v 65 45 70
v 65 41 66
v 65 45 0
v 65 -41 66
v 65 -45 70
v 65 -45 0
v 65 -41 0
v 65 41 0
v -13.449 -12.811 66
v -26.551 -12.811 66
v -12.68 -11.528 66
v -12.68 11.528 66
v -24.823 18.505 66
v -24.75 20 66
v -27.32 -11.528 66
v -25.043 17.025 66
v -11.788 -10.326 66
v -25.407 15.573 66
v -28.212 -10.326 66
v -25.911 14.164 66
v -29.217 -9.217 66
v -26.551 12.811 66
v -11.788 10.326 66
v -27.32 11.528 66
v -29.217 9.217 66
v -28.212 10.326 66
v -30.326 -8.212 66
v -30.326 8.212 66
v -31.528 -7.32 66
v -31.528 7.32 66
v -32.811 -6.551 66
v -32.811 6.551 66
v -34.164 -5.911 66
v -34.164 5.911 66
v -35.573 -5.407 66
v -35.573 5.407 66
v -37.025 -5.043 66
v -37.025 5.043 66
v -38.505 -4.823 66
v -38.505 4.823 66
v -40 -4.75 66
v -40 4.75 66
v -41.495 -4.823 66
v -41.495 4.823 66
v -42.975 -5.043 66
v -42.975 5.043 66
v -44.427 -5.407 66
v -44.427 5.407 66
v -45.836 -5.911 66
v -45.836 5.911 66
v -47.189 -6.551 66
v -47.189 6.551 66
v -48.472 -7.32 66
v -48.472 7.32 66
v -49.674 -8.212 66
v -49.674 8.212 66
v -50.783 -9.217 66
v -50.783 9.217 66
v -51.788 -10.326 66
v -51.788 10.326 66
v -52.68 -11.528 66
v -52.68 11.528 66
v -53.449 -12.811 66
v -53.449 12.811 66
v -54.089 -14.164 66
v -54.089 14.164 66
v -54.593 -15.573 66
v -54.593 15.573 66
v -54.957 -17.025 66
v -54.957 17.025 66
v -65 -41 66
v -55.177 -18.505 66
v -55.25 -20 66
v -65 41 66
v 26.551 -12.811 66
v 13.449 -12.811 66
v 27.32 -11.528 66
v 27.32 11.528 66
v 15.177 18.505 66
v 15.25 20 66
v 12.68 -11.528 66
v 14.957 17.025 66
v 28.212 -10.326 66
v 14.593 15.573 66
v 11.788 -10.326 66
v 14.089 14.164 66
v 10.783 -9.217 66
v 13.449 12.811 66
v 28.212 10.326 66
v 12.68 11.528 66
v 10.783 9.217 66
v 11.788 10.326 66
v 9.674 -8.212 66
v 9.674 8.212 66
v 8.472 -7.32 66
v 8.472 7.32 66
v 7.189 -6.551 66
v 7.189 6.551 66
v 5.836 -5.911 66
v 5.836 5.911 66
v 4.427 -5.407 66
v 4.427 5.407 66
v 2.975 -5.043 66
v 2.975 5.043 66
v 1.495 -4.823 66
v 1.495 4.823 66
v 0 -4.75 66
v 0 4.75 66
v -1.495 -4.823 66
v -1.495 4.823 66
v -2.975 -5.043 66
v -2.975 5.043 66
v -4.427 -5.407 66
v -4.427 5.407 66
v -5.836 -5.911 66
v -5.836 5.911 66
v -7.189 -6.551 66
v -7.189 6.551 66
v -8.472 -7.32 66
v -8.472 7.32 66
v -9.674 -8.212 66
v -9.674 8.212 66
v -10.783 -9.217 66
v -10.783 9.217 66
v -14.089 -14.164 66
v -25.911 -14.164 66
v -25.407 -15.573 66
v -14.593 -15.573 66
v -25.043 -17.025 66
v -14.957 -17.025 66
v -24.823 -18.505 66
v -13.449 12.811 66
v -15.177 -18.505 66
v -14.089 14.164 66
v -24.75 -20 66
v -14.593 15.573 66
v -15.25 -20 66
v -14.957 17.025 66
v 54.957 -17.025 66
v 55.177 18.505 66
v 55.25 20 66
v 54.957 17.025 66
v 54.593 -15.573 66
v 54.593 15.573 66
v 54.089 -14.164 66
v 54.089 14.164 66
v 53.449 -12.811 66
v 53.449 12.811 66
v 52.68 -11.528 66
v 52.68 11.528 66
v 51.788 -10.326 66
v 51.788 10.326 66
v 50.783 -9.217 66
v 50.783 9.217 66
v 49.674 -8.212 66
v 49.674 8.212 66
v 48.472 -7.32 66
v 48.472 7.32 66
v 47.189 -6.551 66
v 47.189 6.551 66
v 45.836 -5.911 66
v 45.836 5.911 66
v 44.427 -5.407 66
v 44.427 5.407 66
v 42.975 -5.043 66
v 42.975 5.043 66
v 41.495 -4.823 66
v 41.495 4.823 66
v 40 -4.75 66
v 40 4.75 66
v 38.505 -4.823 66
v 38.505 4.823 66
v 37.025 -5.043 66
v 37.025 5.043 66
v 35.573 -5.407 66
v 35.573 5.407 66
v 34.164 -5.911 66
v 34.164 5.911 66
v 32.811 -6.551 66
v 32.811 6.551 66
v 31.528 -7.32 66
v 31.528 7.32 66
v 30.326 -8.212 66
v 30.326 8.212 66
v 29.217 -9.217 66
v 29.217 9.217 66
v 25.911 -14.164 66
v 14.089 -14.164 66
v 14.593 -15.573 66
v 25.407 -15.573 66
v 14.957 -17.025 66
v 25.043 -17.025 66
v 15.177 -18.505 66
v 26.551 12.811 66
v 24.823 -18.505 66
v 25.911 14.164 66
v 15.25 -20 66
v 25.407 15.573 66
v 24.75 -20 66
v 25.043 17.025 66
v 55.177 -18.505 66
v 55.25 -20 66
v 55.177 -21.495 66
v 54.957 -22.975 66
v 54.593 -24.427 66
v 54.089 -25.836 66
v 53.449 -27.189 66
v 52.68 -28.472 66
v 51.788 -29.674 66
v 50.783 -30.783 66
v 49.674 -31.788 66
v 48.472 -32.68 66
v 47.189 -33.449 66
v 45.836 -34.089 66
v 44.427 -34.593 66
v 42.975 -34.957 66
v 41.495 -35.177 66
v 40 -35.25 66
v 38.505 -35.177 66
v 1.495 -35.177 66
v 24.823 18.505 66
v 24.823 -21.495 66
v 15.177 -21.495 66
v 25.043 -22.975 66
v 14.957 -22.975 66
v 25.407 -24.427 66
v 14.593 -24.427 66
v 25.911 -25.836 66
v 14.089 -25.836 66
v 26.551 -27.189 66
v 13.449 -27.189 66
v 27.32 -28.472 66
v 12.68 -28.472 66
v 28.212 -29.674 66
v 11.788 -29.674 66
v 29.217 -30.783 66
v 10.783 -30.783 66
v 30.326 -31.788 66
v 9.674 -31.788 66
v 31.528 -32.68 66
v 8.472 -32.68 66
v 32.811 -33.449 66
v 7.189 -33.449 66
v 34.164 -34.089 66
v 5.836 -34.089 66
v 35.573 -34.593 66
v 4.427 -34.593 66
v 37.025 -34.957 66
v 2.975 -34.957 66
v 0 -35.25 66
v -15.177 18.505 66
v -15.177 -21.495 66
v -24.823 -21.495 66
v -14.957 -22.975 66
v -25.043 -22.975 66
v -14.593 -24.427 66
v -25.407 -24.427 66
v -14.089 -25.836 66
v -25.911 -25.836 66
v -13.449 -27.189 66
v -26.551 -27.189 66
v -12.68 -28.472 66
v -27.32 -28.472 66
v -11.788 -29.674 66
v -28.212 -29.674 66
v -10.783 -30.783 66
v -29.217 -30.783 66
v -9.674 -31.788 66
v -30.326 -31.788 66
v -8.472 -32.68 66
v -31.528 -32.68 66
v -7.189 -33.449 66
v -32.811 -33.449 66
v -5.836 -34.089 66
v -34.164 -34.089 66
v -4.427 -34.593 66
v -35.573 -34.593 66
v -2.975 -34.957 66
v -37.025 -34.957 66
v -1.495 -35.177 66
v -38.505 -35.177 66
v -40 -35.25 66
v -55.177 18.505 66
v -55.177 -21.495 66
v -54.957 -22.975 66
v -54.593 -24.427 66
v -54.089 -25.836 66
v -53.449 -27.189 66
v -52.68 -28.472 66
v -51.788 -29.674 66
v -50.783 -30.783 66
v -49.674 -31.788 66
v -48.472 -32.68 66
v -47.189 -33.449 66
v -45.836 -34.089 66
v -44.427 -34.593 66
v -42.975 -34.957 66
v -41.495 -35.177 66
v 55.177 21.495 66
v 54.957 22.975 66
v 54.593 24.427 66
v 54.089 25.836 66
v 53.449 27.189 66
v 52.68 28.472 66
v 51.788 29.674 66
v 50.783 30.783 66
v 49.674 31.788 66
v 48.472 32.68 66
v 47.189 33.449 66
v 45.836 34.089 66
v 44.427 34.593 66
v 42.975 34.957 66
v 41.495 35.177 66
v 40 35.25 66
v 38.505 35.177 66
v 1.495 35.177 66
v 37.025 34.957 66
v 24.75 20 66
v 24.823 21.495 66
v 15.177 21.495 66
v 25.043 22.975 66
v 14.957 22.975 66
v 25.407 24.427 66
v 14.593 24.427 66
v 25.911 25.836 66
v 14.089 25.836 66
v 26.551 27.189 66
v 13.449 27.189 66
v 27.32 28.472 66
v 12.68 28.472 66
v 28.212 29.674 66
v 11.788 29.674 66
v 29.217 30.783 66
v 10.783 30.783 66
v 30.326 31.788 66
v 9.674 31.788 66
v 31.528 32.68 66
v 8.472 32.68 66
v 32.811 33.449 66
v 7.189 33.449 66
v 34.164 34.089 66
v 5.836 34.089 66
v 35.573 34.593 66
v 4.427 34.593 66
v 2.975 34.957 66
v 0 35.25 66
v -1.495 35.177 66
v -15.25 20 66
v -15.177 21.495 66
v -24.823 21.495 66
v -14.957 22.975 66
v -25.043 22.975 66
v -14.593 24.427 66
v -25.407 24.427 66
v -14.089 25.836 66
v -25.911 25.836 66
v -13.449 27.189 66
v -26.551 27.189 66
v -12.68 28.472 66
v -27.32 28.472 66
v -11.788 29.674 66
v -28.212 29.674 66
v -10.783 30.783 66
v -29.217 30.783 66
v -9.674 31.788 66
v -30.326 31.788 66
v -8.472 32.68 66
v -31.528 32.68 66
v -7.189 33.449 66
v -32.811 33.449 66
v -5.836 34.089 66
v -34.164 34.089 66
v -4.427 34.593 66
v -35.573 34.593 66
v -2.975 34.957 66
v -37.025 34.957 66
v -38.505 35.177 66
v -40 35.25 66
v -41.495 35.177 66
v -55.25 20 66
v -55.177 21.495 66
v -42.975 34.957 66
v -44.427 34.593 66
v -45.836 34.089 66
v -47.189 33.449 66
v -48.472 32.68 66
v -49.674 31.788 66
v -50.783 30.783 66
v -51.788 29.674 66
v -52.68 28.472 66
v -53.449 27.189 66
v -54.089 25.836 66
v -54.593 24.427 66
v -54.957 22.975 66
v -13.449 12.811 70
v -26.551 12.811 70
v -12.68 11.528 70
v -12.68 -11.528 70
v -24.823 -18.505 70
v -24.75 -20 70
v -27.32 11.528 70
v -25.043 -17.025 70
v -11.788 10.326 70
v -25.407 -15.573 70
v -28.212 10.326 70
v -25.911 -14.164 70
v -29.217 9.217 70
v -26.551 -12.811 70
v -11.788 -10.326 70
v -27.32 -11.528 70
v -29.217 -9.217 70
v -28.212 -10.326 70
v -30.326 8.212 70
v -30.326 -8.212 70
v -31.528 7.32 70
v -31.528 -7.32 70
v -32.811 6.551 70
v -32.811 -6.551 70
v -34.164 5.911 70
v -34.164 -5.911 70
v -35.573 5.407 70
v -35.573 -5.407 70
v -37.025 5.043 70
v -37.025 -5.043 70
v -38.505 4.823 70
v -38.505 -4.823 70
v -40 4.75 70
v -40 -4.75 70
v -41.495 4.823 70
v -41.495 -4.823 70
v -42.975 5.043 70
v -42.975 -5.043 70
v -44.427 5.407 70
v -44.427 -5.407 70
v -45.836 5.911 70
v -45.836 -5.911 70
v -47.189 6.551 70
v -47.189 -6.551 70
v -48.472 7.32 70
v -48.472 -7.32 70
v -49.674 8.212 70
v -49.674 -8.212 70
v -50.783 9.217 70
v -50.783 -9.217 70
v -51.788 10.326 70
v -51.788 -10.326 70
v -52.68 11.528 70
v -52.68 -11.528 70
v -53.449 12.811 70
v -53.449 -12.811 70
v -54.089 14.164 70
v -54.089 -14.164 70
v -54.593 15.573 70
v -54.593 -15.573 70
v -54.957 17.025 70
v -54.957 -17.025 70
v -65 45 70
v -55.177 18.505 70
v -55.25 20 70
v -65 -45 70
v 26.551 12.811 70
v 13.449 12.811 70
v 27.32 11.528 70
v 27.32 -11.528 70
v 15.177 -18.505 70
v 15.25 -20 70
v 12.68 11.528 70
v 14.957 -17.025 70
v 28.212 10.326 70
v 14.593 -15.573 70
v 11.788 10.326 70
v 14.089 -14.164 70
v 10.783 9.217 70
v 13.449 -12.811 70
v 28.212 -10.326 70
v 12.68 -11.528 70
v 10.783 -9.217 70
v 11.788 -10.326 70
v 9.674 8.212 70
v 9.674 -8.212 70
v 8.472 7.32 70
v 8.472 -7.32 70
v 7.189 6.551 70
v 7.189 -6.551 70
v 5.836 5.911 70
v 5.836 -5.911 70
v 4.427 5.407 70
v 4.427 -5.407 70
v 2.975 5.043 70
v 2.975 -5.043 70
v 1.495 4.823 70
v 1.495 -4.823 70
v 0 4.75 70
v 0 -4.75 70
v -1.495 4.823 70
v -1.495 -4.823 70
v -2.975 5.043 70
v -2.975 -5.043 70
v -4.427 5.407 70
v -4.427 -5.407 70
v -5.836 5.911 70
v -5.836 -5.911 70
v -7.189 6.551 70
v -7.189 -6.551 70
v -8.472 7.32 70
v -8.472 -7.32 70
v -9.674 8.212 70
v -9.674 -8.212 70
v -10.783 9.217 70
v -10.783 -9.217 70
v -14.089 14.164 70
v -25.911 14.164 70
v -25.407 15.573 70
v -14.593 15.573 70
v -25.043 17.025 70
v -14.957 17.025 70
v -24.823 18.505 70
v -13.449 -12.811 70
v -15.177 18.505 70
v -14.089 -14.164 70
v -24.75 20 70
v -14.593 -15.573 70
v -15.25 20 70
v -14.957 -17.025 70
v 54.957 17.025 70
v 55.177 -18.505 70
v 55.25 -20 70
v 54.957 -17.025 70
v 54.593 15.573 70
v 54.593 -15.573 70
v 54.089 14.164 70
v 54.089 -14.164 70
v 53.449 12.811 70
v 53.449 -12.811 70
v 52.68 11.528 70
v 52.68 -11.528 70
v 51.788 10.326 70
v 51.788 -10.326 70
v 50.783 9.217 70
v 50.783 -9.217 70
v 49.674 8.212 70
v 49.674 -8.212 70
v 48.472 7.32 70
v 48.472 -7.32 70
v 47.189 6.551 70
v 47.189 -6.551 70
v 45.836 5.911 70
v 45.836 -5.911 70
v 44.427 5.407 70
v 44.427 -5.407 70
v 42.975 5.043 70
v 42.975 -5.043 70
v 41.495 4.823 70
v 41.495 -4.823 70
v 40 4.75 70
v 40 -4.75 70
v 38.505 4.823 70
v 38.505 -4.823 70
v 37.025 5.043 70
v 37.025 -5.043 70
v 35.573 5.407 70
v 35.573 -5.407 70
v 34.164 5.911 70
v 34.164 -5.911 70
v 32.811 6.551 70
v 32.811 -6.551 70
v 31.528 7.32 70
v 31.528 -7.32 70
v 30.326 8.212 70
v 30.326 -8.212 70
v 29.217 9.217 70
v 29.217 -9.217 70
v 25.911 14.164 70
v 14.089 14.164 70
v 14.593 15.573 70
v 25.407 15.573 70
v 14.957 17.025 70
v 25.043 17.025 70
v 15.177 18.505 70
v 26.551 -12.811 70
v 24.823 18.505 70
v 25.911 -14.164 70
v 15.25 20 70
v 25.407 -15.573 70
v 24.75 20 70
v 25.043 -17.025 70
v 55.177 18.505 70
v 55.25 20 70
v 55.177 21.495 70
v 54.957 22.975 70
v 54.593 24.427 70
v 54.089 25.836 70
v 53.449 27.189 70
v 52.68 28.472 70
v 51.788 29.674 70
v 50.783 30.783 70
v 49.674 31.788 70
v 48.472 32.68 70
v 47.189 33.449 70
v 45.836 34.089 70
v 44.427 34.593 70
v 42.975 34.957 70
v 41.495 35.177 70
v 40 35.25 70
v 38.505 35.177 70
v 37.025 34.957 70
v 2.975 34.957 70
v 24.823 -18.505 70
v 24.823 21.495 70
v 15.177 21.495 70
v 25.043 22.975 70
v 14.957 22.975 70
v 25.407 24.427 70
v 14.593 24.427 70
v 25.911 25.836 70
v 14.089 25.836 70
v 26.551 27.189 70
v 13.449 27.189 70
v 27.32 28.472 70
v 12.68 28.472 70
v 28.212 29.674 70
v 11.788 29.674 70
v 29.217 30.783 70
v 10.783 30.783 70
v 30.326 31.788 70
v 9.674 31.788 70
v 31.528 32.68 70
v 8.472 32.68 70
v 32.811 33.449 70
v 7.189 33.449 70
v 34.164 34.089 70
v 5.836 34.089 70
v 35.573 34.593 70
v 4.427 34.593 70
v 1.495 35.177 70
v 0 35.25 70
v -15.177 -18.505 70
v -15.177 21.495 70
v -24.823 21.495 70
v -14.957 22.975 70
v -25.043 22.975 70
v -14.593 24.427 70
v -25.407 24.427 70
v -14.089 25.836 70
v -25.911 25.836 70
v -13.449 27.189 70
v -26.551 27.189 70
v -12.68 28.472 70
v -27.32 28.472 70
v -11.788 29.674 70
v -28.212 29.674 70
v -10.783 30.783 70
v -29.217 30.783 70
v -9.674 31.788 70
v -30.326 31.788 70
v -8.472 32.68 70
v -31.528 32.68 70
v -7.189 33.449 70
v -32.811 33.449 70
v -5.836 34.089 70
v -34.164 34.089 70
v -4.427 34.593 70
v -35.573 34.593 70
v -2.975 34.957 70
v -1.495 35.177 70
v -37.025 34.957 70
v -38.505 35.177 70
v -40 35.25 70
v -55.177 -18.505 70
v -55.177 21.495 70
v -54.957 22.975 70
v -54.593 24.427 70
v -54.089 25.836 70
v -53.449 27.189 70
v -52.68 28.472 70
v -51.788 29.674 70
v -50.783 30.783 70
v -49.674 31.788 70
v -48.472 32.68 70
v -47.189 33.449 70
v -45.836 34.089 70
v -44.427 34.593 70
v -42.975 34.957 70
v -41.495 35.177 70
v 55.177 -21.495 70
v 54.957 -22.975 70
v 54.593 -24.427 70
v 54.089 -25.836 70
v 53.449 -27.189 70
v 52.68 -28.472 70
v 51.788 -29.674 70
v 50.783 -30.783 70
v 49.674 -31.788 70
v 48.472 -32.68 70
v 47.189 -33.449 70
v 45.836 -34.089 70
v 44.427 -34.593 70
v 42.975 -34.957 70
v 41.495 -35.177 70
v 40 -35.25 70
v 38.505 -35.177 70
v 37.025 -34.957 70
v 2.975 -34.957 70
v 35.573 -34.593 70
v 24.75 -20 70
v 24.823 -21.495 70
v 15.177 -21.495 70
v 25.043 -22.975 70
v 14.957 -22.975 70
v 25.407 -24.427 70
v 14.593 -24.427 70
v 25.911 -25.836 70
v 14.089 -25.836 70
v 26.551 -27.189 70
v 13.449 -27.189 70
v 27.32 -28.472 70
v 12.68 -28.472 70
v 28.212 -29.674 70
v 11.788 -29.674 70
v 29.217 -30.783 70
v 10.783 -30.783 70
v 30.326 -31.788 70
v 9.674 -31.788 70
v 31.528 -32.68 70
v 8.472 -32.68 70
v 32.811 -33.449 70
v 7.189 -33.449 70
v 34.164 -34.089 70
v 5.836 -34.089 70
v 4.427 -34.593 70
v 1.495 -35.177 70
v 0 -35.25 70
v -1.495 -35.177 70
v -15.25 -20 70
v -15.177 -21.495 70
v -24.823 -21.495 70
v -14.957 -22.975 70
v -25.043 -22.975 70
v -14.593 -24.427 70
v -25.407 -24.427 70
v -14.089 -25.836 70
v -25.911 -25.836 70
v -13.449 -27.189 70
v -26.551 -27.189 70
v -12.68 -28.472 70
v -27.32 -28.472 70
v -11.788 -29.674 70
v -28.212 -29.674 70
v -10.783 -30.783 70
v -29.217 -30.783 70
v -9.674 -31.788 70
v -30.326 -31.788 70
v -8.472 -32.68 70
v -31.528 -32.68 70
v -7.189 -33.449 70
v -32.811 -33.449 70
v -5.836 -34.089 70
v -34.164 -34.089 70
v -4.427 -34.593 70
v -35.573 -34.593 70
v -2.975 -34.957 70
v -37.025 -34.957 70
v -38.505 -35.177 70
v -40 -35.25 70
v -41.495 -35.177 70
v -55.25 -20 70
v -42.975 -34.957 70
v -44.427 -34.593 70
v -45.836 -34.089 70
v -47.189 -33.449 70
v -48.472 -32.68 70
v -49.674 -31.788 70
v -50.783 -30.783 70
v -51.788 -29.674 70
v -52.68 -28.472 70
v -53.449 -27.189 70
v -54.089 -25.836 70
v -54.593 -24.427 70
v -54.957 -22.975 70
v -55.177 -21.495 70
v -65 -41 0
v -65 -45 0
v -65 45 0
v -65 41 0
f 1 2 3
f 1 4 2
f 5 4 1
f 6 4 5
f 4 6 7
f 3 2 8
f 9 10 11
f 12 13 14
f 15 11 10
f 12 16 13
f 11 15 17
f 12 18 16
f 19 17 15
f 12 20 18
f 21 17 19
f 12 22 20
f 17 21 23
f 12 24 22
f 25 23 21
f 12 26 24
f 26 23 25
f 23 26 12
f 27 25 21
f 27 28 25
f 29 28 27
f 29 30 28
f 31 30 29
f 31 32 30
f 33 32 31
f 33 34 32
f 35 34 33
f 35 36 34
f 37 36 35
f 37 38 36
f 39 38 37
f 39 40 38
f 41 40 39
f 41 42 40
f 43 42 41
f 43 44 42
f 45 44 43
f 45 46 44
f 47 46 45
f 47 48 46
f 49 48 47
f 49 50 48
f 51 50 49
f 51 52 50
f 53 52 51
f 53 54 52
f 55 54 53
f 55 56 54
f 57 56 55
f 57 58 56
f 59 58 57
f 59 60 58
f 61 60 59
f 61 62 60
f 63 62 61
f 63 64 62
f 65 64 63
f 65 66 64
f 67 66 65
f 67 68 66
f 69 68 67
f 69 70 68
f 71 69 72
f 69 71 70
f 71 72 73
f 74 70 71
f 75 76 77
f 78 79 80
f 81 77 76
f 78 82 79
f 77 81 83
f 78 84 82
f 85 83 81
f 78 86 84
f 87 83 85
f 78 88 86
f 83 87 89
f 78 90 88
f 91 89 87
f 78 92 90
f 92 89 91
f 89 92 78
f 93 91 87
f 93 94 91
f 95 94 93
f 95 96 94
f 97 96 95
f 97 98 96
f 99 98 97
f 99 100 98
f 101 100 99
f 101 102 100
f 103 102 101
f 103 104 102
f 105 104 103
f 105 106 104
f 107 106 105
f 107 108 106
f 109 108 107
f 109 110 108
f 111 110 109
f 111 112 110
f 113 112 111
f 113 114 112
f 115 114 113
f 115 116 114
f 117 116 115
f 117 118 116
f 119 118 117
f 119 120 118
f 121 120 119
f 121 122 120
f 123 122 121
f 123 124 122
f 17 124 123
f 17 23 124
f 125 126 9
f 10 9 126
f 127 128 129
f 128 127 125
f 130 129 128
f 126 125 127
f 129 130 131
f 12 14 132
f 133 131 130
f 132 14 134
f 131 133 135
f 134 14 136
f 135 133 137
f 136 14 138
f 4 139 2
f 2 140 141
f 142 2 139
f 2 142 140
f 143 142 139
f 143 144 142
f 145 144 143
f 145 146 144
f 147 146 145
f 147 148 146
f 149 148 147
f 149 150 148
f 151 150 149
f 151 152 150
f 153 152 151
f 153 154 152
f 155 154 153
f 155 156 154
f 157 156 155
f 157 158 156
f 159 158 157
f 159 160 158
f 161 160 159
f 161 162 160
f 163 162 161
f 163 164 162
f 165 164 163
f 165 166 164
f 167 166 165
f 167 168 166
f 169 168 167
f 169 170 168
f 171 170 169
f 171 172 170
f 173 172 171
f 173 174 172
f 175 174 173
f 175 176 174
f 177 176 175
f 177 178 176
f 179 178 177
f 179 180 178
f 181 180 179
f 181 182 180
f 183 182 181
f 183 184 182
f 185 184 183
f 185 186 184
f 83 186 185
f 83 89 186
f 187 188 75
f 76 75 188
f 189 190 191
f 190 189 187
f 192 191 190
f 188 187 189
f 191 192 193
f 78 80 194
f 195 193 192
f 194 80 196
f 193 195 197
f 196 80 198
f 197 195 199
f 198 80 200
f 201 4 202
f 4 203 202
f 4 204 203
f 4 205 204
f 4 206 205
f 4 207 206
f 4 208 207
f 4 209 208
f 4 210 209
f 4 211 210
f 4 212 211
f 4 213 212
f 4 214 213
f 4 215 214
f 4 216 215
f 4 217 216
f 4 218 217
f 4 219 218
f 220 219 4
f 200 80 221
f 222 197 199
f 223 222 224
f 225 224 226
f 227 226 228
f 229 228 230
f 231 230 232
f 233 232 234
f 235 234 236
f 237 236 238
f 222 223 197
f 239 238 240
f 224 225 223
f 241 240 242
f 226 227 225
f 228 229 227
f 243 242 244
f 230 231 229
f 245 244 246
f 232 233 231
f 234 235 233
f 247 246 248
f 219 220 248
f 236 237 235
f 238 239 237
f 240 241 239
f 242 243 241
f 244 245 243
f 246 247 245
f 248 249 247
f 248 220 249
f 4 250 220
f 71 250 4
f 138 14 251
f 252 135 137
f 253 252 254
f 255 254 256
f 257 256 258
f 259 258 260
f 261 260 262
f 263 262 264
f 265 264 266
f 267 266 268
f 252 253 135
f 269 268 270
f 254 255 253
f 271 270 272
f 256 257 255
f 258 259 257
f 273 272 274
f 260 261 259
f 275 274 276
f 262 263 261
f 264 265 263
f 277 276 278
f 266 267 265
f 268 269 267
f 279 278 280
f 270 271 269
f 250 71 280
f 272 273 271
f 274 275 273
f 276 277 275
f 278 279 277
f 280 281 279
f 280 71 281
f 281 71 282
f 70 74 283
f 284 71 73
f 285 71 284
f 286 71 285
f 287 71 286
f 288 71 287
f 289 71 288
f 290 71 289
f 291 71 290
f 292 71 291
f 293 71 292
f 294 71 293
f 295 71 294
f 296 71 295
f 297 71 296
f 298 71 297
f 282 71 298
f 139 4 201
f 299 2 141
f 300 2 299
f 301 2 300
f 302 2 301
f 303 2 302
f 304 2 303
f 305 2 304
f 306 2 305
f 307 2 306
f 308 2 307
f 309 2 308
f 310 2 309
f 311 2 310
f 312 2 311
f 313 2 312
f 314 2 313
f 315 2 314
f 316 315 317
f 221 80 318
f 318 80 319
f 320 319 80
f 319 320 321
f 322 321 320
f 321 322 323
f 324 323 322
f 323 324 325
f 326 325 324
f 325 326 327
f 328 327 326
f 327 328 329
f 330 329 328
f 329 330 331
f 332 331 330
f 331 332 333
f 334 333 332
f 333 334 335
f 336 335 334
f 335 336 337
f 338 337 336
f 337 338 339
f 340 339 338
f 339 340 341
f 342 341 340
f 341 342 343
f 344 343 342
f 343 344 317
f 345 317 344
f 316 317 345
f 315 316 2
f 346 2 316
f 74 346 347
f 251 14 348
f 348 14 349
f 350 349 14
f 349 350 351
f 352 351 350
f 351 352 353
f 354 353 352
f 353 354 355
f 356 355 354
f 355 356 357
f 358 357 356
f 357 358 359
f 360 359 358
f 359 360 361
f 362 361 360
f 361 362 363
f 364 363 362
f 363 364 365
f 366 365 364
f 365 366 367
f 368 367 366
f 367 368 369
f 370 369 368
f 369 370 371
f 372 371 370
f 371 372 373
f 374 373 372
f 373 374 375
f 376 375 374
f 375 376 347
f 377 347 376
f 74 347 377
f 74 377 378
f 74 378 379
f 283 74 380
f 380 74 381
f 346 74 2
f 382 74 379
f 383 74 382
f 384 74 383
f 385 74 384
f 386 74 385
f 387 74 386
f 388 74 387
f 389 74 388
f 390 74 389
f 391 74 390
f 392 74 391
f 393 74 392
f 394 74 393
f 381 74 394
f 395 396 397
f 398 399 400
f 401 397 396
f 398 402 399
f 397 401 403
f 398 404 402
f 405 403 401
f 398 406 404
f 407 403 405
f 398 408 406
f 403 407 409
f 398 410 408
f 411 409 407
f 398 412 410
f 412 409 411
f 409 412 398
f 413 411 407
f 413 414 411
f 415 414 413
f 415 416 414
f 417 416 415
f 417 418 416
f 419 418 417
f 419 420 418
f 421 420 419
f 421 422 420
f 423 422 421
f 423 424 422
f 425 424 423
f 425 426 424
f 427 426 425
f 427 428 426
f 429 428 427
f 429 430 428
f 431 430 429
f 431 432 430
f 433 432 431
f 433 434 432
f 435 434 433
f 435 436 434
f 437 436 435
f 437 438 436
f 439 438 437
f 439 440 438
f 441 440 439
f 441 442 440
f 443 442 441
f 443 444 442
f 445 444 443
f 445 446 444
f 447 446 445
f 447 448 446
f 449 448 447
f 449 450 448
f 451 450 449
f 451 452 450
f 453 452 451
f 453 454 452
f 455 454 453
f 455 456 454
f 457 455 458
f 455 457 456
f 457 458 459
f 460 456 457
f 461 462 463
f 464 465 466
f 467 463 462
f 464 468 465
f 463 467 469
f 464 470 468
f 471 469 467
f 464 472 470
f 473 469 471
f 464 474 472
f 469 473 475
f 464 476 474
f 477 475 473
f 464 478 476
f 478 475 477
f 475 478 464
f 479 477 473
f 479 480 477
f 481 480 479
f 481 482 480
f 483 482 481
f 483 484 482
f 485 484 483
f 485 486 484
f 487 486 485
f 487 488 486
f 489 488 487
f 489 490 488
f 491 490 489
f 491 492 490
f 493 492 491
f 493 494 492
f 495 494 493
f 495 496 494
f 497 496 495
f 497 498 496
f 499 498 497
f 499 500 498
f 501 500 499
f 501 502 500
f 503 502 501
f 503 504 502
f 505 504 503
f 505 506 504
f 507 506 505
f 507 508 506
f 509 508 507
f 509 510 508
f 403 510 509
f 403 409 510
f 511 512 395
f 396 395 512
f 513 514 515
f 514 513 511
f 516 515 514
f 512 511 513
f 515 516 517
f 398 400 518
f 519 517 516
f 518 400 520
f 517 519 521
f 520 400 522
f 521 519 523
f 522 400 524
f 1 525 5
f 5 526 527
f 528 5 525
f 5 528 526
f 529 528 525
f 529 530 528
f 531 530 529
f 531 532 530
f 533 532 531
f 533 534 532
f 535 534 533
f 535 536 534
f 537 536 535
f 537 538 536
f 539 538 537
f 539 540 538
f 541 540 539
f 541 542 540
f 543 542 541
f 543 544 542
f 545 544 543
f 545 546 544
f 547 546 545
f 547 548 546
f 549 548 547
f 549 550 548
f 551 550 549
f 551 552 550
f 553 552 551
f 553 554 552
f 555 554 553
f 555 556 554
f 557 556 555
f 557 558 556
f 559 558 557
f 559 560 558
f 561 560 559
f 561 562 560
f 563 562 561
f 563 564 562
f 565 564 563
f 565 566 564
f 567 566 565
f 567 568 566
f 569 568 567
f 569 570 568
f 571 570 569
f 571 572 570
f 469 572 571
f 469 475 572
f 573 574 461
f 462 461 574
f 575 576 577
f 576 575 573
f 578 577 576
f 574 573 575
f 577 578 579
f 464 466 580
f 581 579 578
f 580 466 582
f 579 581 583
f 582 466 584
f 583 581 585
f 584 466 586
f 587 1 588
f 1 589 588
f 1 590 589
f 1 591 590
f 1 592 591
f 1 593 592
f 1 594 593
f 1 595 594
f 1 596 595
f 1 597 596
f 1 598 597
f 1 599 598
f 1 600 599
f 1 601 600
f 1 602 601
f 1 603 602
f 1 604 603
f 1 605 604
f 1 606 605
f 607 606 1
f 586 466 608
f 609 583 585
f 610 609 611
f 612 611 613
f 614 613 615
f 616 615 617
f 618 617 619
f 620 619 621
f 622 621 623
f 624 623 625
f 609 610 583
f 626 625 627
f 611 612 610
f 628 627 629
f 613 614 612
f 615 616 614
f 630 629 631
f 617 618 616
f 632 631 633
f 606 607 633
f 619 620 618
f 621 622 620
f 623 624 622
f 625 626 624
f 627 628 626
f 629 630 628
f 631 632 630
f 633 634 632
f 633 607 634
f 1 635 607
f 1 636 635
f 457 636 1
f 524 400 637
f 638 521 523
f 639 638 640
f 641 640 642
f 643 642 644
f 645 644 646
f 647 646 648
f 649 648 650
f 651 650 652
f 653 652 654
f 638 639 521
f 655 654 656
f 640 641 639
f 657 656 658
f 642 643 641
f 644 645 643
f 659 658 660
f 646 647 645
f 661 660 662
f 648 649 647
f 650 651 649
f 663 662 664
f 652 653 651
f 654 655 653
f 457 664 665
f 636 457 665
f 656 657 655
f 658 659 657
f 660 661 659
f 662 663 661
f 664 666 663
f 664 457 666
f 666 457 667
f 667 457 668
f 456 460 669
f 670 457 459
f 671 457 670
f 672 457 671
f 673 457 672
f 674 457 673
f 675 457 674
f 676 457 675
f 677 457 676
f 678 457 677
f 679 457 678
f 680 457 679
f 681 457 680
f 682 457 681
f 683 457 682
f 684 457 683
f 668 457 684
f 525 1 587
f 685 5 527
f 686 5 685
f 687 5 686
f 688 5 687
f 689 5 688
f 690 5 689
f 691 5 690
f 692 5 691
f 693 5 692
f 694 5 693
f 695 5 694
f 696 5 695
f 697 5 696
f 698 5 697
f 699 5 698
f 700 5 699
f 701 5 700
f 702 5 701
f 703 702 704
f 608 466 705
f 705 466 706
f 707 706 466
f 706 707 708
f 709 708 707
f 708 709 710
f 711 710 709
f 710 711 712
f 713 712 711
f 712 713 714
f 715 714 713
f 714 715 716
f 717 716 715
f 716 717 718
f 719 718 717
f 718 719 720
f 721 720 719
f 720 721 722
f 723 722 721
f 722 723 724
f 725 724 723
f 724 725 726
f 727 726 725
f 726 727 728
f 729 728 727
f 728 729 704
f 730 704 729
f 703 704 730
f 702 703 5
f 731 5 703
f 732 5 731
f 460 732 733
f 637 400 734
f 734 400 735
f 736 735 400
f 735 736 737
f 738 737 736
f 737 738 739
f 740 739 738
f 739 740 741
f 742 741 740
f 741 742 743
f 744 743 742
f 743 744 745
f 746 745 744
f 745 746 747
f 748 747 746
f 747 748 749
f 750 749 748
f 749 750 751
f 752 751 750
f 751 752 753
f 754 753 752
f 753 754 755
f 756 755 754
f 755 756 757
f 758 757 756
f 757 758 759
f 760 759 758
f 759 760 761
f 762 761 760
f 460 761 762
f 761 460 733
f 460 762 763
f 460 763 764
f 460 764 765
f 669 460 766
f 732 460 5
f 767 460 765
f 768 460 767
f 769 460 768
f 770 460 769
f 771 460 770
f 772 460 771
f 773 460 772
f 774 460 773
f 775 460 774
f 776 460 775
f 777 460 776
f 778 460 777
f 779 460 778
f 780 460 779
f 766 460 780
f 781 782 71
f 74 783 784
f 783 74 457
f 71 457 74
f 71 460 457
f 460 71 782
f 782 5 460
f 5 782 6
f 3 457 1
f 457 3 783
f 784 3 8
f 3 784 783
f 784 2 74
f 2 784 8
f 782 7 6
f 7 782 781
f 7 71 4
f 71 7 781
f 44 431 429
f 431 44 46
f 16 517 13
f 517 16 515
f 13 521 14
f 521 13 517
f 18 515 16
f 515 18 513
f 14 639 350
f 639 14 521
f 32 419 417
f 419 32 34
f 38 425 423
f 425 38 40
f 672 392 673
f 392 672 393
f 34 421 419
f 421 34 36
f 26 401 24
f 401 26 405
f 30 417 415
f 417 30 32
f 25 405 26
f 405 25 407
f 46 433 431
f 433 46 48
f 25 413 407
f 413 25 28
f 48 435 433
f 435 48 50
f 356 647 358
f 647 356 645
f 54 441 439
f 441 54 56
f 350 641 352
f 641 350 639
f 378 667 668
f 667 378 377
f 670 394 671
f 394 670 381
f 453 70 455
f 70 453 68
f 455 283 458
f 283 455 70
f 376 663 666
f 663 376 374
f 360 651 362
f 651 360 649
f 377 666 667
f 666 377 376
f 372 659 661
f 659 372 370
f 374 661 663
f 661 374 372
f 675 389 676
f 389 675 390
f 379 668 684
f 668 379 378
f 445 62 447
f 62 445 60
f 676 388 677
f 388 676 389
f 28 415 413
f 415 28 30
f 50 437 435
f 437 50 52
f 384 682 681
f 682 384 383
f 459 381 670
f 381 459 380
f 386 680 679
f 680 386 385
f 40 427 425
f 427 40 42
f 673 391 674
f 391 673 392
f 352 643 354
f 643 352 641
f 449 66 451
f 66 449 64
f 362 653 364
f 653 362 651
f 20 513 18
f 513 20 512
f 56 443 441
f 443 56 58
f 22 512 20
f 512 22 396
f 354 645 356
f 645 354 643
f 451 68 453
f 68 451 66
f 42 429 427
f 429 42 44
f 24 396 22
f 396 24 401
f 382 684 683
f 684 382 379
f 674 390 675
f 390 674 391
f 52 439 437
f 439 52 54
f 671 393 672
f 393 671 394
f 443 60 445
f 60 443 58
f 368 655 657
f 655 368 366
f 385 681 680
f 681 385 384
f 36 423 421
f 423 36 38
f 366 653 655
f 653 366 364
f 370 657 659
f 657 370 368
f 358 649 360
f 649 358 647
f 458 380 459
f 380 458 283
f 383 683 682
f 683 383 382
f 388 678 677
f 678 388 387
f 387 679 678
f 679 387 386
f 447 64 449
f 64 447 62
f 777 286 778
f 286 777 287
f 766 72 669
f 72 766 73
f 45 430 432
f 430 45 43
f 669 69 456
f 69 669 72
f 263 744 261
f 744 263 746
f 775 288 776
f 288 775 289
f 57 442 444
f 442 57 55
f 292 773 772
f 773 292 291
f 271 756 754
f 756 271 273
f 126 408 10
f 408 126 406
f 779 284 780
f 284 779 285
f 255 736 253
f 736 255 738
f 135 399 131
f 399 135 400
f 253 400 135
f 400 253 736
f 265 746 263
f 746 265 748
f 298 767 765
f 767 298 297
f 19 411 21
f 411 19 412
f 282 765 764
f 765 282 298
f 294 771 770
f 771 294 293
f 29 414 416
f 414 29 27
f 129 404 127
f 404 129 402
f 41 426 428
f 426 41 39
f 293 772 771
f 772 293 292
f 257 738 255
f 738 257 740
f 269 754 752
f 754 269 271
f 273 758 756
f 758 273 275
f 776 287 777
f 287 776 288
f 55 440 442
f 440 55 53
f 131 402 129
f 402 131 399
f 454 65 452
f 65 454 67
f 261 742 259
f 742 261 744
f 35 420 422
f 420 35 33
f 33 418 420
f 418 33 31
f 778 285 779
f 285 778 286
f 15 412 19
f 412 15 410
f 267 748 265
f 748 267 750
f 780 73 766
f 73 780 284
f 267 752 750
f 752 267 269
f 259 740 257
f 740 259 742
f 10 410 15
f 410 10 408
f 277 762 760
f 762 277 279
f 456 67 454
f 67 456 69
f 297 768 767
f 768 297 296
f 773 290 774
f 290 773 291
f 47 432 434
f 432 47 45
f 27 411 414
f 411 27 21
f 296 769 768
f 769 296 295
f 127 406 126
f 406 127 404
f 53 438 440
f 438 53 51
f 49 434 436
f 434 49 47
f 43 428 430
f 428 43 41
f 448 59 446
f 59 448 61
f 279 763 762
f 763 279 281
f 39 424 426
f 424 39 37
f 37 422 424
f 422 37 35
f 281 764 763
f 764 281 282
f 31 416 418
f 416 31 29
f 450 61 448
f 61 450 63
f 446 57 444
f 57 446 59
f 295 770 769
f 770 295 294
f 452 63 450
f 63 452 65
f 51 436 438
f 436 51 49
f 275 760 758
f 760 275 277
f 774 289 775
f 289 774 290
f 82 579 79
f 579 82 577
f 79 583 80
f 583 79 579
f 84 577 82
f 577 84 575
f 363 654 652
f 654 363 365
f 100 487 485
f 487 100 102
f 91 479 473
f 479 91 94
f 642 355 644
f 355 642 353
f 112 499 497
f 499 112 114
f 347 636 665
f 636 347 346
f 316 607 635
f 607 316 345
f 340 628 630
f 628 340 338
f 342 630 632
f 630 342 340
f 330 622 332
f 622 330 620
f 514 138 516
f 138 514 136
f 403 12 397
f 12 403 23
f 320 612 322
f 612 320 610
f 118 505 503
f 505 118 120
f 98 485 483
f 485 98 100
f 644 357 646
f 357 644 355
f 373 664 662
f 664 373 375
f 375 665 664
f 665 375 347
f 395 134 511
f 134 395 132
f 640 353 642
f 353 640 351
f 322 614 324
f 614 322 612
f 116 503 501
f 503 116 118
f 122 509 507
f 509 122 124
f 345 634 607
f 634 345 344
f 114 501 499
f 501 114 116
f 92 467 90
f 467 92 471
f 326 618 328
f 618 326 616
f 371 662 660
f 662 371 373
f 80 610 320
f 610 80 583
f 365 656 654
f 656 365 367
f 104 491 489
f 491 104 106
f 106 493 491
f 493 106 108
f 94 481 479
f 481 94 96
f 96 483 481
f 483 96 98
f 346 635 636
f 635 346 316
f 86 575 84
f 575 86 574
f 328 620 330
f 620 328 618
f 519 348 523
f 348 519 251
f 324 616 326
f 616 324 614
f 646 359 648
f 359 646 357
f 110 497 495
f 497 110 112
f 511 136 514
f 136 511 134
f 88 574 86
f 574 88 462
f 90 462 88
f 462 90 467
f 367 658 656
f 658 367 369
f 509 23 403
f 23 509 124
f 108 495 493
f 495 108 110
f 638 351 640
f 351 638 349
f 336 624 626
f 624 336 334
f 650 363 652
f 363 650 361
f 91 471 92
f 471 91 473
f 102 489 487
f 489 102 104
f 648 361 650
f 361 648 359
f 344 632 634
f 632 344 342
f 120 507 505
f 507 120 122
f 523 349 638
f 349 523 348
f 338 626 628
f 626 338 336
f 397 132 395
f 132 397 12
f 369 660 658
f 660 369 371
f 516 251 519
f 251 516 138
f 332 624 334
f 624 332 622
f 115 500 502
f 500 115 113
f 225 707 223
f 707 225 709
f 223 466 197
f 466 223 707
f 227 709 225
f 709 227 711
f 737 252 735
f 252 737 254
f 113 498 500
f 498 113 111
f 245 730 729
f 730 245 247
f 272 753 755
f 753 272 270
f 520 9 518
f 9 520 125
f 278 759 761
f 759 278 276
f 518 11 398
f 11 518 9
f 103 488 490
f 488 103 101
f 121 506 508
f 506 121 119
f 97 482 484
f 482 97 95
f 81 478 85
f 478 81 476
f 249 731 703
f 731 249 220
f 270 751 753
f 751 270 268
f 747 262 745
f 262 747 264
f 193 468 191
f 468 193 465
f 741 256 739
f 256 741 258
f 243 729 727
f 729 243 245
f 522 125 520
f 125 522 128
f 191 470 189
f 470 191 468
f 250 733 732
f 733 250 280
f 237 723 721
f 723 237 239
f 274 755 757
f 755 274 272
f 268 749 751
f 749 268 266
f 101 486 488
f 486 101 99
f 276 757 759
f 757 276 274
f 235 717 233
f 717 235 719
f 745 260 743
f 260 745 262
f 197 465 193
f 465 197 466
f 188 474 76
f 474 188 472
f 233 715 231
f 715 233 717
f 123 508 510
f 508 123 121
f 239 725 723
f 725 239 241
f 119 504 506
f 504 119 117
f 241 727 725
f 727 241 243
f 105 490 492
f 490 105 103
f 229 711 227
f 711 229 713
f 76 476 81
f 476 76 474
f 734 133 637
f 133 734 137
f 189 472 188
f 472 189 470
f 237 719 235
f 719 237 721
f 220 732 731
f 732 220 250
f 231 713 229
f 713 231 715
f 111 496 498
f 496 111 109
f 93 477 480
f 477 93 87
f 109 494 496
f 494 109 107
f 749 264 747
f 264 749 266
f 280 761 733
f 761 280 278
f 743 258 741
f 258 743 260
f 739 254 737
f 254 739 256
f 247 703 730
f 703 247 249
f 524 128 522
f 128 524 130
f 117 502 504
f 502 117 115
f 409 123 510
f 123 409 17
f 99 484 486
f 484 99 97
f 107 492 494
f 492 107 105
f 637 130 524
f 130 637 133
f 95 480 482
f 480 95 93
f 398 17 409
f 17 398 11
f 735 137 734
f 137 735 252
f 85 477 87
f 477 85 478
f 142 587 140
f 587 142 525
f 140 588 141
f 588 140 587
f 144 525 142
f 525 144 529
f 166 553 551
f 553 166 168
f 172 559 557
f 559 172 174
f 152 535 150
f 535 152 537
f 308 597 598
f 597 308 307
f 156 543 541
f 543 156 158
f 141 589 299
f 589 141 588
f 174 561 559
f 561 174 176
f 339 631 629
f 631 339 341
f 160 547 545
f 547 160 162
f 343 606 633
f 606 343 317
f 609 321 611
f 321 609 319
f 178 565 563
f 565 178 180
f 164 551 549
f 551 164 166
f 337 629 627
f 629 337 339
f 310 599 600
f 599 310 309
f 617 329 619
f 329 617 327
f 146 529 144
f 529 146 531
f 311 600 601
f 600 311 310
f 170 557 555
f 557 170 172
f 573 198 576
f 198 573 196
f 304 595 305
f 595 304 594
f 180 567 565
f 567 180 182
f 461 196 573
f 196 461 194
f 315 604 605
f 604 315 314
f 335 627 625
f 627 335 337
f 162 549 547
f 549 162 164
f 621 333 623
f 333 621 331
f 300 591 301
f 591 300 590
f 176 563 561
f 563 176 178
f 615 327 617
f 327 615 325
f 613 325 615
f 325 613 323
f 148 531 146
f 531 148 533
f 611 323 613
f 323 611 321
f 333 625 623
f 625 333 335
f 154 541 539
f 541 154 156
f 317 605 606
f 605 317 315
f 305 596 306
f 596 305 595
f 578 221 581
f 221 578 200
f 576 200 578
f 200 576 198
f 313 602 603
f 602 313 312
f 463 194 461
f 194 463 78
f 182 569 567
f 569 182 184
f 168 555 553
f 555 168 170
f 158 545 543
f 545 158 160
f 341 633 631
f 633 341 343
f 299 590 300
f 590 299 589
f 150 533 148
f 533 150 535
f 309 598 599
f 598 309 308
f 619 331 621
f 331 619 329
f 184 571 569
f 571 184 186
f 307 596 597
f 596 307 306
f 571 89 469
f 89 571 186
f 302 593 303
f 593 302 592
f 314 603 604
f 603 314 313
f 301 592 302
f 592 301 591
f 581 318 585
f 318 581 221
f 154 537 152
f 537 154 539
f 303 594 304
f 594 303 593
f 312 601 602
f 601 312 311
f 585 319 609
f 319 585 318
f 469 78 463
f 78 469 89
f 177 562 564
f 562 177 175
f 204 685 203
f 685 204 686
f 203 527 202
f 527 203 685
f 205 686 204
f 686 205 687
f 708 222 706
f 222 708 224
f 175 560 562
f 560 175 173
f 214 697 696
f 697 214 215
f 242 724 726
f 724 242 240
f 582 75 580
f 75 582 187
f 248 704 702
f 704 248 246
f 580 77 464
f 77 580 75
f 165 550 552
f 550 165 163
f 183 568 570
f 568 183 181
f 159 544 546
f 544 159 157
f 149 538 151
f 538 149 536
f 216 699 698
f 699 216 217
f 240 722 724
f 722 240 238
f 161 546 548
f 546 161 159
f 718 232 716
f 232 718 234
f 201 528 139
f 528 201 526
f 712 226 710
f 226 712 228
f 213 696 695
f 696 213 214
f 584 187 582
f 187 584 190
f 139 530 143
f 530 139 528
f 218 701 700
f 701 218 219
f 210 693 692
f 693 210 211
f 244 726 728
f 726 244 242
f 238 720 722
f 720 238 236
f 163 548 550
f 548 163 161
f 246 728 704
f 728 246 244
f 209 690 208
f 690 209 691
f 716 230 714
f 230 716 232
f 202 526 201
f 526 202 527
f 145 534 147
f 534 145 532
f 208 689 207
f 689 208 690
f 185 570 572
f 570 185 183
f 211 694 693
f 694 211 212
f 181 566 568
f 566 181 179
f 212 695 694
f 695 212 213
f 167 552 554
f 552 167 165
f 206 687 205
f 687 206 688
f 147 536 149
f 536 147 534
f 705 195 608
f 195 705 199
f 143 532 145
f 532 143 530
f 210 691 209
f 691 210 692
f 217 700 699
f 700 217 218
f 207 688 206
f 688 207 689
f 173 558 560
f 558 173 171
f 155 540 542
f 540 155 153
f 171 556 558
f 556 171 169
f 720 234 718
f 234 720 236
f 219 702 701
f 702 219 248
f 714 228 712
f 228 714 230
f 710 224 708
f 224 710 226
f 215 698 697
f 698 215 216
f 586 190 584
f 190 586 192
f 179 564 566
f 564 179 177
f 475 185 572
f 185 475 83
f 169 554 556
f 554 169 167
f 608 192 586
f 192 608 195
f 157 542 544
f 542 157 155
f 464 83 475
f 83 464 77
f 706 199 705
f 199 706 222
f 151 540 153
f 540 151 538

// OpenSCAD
// 50mL Conical Tube Rack
// Designed for printing upside down (walls on bed)
// and flipped to stand on the walls.

// --- Dimensions ---
plate_x      = 130.0; // Length of the plate (X)
plate_y      = 90.0;  // Width of the plate (Y)
plate_z      = 4.0;   // Thickness of the plate (Z)

hole_d       = 30.5;  // Diameter of the tube holes
rows         = 2;     // Number of rows (along Y)
cols         = 3;     // Number of columns (along X)
spacing      = 40.0;  // Center-to-center distance between holes

wall_x       = 130.0; // Length of the side walls (X)
wall_y       = 4.0;   // Thickness of the side walls (Y)
wall_h       = 70.0;  // Total height of the walls from the base (Z)

$fn = 64;

// --- Calculations ---
x_offset = (cols - 1) * spacing / 2;
y_offset = (rows - 1) * spacing / 2;

module functional_rack() {
    difference() {
        union() {
            // The Base Plate
            translate([-plate_x/2, -plate_y/2, 0])
                cube([plate_x, plate_y, plate_z]);
            
            // The Two Side Walls
            // Wall 1 (along one long edge)
            translate([-plate_x/2, -plate_y/2, plate_z])
                cube([plate_x, wall_y, wall_h - plate_z]);
            
            // Wall 2 (along the other long edge)
            translate([-plate_x/2, plate_y/2 - wall_y, plate_z])
                cube([plate_x, wall_y, wall_h - plate_z]);
        }

        // The Six Holes
        for (i = [0 : cols - 1]) {
            for (j = [0 : rows - 1]) {
                hx = (i * spacing) - x_offset;
                hy = (j * spacing) - y_offset;
                
                // Subtracting the hole. 
                // We extend the hole in Z to ensure a clean cut through the plate.
                translate([hx, hy, -1])
                    cylinder(h = plate_z + 2, d = hole_d);
            }
        }
    }
}

// --- Print Orientation Logic ---
// Functional: Plate at Z=0, Walls up to Z=70.
// Print: Walls at Z=0, Plate at Z=66 to 70.
// To do this: 
// 1. Rotate 180 around X so plate is at top and walls are at bottom.
// 2. The part is now at Z = -70 to 0.
// 3. Translate by +70 in Z to bring it to Z = 0 to 70.

translate([0, 0, wall_h])
    rotate([180, 0, 0]) 
        functional_rack();
